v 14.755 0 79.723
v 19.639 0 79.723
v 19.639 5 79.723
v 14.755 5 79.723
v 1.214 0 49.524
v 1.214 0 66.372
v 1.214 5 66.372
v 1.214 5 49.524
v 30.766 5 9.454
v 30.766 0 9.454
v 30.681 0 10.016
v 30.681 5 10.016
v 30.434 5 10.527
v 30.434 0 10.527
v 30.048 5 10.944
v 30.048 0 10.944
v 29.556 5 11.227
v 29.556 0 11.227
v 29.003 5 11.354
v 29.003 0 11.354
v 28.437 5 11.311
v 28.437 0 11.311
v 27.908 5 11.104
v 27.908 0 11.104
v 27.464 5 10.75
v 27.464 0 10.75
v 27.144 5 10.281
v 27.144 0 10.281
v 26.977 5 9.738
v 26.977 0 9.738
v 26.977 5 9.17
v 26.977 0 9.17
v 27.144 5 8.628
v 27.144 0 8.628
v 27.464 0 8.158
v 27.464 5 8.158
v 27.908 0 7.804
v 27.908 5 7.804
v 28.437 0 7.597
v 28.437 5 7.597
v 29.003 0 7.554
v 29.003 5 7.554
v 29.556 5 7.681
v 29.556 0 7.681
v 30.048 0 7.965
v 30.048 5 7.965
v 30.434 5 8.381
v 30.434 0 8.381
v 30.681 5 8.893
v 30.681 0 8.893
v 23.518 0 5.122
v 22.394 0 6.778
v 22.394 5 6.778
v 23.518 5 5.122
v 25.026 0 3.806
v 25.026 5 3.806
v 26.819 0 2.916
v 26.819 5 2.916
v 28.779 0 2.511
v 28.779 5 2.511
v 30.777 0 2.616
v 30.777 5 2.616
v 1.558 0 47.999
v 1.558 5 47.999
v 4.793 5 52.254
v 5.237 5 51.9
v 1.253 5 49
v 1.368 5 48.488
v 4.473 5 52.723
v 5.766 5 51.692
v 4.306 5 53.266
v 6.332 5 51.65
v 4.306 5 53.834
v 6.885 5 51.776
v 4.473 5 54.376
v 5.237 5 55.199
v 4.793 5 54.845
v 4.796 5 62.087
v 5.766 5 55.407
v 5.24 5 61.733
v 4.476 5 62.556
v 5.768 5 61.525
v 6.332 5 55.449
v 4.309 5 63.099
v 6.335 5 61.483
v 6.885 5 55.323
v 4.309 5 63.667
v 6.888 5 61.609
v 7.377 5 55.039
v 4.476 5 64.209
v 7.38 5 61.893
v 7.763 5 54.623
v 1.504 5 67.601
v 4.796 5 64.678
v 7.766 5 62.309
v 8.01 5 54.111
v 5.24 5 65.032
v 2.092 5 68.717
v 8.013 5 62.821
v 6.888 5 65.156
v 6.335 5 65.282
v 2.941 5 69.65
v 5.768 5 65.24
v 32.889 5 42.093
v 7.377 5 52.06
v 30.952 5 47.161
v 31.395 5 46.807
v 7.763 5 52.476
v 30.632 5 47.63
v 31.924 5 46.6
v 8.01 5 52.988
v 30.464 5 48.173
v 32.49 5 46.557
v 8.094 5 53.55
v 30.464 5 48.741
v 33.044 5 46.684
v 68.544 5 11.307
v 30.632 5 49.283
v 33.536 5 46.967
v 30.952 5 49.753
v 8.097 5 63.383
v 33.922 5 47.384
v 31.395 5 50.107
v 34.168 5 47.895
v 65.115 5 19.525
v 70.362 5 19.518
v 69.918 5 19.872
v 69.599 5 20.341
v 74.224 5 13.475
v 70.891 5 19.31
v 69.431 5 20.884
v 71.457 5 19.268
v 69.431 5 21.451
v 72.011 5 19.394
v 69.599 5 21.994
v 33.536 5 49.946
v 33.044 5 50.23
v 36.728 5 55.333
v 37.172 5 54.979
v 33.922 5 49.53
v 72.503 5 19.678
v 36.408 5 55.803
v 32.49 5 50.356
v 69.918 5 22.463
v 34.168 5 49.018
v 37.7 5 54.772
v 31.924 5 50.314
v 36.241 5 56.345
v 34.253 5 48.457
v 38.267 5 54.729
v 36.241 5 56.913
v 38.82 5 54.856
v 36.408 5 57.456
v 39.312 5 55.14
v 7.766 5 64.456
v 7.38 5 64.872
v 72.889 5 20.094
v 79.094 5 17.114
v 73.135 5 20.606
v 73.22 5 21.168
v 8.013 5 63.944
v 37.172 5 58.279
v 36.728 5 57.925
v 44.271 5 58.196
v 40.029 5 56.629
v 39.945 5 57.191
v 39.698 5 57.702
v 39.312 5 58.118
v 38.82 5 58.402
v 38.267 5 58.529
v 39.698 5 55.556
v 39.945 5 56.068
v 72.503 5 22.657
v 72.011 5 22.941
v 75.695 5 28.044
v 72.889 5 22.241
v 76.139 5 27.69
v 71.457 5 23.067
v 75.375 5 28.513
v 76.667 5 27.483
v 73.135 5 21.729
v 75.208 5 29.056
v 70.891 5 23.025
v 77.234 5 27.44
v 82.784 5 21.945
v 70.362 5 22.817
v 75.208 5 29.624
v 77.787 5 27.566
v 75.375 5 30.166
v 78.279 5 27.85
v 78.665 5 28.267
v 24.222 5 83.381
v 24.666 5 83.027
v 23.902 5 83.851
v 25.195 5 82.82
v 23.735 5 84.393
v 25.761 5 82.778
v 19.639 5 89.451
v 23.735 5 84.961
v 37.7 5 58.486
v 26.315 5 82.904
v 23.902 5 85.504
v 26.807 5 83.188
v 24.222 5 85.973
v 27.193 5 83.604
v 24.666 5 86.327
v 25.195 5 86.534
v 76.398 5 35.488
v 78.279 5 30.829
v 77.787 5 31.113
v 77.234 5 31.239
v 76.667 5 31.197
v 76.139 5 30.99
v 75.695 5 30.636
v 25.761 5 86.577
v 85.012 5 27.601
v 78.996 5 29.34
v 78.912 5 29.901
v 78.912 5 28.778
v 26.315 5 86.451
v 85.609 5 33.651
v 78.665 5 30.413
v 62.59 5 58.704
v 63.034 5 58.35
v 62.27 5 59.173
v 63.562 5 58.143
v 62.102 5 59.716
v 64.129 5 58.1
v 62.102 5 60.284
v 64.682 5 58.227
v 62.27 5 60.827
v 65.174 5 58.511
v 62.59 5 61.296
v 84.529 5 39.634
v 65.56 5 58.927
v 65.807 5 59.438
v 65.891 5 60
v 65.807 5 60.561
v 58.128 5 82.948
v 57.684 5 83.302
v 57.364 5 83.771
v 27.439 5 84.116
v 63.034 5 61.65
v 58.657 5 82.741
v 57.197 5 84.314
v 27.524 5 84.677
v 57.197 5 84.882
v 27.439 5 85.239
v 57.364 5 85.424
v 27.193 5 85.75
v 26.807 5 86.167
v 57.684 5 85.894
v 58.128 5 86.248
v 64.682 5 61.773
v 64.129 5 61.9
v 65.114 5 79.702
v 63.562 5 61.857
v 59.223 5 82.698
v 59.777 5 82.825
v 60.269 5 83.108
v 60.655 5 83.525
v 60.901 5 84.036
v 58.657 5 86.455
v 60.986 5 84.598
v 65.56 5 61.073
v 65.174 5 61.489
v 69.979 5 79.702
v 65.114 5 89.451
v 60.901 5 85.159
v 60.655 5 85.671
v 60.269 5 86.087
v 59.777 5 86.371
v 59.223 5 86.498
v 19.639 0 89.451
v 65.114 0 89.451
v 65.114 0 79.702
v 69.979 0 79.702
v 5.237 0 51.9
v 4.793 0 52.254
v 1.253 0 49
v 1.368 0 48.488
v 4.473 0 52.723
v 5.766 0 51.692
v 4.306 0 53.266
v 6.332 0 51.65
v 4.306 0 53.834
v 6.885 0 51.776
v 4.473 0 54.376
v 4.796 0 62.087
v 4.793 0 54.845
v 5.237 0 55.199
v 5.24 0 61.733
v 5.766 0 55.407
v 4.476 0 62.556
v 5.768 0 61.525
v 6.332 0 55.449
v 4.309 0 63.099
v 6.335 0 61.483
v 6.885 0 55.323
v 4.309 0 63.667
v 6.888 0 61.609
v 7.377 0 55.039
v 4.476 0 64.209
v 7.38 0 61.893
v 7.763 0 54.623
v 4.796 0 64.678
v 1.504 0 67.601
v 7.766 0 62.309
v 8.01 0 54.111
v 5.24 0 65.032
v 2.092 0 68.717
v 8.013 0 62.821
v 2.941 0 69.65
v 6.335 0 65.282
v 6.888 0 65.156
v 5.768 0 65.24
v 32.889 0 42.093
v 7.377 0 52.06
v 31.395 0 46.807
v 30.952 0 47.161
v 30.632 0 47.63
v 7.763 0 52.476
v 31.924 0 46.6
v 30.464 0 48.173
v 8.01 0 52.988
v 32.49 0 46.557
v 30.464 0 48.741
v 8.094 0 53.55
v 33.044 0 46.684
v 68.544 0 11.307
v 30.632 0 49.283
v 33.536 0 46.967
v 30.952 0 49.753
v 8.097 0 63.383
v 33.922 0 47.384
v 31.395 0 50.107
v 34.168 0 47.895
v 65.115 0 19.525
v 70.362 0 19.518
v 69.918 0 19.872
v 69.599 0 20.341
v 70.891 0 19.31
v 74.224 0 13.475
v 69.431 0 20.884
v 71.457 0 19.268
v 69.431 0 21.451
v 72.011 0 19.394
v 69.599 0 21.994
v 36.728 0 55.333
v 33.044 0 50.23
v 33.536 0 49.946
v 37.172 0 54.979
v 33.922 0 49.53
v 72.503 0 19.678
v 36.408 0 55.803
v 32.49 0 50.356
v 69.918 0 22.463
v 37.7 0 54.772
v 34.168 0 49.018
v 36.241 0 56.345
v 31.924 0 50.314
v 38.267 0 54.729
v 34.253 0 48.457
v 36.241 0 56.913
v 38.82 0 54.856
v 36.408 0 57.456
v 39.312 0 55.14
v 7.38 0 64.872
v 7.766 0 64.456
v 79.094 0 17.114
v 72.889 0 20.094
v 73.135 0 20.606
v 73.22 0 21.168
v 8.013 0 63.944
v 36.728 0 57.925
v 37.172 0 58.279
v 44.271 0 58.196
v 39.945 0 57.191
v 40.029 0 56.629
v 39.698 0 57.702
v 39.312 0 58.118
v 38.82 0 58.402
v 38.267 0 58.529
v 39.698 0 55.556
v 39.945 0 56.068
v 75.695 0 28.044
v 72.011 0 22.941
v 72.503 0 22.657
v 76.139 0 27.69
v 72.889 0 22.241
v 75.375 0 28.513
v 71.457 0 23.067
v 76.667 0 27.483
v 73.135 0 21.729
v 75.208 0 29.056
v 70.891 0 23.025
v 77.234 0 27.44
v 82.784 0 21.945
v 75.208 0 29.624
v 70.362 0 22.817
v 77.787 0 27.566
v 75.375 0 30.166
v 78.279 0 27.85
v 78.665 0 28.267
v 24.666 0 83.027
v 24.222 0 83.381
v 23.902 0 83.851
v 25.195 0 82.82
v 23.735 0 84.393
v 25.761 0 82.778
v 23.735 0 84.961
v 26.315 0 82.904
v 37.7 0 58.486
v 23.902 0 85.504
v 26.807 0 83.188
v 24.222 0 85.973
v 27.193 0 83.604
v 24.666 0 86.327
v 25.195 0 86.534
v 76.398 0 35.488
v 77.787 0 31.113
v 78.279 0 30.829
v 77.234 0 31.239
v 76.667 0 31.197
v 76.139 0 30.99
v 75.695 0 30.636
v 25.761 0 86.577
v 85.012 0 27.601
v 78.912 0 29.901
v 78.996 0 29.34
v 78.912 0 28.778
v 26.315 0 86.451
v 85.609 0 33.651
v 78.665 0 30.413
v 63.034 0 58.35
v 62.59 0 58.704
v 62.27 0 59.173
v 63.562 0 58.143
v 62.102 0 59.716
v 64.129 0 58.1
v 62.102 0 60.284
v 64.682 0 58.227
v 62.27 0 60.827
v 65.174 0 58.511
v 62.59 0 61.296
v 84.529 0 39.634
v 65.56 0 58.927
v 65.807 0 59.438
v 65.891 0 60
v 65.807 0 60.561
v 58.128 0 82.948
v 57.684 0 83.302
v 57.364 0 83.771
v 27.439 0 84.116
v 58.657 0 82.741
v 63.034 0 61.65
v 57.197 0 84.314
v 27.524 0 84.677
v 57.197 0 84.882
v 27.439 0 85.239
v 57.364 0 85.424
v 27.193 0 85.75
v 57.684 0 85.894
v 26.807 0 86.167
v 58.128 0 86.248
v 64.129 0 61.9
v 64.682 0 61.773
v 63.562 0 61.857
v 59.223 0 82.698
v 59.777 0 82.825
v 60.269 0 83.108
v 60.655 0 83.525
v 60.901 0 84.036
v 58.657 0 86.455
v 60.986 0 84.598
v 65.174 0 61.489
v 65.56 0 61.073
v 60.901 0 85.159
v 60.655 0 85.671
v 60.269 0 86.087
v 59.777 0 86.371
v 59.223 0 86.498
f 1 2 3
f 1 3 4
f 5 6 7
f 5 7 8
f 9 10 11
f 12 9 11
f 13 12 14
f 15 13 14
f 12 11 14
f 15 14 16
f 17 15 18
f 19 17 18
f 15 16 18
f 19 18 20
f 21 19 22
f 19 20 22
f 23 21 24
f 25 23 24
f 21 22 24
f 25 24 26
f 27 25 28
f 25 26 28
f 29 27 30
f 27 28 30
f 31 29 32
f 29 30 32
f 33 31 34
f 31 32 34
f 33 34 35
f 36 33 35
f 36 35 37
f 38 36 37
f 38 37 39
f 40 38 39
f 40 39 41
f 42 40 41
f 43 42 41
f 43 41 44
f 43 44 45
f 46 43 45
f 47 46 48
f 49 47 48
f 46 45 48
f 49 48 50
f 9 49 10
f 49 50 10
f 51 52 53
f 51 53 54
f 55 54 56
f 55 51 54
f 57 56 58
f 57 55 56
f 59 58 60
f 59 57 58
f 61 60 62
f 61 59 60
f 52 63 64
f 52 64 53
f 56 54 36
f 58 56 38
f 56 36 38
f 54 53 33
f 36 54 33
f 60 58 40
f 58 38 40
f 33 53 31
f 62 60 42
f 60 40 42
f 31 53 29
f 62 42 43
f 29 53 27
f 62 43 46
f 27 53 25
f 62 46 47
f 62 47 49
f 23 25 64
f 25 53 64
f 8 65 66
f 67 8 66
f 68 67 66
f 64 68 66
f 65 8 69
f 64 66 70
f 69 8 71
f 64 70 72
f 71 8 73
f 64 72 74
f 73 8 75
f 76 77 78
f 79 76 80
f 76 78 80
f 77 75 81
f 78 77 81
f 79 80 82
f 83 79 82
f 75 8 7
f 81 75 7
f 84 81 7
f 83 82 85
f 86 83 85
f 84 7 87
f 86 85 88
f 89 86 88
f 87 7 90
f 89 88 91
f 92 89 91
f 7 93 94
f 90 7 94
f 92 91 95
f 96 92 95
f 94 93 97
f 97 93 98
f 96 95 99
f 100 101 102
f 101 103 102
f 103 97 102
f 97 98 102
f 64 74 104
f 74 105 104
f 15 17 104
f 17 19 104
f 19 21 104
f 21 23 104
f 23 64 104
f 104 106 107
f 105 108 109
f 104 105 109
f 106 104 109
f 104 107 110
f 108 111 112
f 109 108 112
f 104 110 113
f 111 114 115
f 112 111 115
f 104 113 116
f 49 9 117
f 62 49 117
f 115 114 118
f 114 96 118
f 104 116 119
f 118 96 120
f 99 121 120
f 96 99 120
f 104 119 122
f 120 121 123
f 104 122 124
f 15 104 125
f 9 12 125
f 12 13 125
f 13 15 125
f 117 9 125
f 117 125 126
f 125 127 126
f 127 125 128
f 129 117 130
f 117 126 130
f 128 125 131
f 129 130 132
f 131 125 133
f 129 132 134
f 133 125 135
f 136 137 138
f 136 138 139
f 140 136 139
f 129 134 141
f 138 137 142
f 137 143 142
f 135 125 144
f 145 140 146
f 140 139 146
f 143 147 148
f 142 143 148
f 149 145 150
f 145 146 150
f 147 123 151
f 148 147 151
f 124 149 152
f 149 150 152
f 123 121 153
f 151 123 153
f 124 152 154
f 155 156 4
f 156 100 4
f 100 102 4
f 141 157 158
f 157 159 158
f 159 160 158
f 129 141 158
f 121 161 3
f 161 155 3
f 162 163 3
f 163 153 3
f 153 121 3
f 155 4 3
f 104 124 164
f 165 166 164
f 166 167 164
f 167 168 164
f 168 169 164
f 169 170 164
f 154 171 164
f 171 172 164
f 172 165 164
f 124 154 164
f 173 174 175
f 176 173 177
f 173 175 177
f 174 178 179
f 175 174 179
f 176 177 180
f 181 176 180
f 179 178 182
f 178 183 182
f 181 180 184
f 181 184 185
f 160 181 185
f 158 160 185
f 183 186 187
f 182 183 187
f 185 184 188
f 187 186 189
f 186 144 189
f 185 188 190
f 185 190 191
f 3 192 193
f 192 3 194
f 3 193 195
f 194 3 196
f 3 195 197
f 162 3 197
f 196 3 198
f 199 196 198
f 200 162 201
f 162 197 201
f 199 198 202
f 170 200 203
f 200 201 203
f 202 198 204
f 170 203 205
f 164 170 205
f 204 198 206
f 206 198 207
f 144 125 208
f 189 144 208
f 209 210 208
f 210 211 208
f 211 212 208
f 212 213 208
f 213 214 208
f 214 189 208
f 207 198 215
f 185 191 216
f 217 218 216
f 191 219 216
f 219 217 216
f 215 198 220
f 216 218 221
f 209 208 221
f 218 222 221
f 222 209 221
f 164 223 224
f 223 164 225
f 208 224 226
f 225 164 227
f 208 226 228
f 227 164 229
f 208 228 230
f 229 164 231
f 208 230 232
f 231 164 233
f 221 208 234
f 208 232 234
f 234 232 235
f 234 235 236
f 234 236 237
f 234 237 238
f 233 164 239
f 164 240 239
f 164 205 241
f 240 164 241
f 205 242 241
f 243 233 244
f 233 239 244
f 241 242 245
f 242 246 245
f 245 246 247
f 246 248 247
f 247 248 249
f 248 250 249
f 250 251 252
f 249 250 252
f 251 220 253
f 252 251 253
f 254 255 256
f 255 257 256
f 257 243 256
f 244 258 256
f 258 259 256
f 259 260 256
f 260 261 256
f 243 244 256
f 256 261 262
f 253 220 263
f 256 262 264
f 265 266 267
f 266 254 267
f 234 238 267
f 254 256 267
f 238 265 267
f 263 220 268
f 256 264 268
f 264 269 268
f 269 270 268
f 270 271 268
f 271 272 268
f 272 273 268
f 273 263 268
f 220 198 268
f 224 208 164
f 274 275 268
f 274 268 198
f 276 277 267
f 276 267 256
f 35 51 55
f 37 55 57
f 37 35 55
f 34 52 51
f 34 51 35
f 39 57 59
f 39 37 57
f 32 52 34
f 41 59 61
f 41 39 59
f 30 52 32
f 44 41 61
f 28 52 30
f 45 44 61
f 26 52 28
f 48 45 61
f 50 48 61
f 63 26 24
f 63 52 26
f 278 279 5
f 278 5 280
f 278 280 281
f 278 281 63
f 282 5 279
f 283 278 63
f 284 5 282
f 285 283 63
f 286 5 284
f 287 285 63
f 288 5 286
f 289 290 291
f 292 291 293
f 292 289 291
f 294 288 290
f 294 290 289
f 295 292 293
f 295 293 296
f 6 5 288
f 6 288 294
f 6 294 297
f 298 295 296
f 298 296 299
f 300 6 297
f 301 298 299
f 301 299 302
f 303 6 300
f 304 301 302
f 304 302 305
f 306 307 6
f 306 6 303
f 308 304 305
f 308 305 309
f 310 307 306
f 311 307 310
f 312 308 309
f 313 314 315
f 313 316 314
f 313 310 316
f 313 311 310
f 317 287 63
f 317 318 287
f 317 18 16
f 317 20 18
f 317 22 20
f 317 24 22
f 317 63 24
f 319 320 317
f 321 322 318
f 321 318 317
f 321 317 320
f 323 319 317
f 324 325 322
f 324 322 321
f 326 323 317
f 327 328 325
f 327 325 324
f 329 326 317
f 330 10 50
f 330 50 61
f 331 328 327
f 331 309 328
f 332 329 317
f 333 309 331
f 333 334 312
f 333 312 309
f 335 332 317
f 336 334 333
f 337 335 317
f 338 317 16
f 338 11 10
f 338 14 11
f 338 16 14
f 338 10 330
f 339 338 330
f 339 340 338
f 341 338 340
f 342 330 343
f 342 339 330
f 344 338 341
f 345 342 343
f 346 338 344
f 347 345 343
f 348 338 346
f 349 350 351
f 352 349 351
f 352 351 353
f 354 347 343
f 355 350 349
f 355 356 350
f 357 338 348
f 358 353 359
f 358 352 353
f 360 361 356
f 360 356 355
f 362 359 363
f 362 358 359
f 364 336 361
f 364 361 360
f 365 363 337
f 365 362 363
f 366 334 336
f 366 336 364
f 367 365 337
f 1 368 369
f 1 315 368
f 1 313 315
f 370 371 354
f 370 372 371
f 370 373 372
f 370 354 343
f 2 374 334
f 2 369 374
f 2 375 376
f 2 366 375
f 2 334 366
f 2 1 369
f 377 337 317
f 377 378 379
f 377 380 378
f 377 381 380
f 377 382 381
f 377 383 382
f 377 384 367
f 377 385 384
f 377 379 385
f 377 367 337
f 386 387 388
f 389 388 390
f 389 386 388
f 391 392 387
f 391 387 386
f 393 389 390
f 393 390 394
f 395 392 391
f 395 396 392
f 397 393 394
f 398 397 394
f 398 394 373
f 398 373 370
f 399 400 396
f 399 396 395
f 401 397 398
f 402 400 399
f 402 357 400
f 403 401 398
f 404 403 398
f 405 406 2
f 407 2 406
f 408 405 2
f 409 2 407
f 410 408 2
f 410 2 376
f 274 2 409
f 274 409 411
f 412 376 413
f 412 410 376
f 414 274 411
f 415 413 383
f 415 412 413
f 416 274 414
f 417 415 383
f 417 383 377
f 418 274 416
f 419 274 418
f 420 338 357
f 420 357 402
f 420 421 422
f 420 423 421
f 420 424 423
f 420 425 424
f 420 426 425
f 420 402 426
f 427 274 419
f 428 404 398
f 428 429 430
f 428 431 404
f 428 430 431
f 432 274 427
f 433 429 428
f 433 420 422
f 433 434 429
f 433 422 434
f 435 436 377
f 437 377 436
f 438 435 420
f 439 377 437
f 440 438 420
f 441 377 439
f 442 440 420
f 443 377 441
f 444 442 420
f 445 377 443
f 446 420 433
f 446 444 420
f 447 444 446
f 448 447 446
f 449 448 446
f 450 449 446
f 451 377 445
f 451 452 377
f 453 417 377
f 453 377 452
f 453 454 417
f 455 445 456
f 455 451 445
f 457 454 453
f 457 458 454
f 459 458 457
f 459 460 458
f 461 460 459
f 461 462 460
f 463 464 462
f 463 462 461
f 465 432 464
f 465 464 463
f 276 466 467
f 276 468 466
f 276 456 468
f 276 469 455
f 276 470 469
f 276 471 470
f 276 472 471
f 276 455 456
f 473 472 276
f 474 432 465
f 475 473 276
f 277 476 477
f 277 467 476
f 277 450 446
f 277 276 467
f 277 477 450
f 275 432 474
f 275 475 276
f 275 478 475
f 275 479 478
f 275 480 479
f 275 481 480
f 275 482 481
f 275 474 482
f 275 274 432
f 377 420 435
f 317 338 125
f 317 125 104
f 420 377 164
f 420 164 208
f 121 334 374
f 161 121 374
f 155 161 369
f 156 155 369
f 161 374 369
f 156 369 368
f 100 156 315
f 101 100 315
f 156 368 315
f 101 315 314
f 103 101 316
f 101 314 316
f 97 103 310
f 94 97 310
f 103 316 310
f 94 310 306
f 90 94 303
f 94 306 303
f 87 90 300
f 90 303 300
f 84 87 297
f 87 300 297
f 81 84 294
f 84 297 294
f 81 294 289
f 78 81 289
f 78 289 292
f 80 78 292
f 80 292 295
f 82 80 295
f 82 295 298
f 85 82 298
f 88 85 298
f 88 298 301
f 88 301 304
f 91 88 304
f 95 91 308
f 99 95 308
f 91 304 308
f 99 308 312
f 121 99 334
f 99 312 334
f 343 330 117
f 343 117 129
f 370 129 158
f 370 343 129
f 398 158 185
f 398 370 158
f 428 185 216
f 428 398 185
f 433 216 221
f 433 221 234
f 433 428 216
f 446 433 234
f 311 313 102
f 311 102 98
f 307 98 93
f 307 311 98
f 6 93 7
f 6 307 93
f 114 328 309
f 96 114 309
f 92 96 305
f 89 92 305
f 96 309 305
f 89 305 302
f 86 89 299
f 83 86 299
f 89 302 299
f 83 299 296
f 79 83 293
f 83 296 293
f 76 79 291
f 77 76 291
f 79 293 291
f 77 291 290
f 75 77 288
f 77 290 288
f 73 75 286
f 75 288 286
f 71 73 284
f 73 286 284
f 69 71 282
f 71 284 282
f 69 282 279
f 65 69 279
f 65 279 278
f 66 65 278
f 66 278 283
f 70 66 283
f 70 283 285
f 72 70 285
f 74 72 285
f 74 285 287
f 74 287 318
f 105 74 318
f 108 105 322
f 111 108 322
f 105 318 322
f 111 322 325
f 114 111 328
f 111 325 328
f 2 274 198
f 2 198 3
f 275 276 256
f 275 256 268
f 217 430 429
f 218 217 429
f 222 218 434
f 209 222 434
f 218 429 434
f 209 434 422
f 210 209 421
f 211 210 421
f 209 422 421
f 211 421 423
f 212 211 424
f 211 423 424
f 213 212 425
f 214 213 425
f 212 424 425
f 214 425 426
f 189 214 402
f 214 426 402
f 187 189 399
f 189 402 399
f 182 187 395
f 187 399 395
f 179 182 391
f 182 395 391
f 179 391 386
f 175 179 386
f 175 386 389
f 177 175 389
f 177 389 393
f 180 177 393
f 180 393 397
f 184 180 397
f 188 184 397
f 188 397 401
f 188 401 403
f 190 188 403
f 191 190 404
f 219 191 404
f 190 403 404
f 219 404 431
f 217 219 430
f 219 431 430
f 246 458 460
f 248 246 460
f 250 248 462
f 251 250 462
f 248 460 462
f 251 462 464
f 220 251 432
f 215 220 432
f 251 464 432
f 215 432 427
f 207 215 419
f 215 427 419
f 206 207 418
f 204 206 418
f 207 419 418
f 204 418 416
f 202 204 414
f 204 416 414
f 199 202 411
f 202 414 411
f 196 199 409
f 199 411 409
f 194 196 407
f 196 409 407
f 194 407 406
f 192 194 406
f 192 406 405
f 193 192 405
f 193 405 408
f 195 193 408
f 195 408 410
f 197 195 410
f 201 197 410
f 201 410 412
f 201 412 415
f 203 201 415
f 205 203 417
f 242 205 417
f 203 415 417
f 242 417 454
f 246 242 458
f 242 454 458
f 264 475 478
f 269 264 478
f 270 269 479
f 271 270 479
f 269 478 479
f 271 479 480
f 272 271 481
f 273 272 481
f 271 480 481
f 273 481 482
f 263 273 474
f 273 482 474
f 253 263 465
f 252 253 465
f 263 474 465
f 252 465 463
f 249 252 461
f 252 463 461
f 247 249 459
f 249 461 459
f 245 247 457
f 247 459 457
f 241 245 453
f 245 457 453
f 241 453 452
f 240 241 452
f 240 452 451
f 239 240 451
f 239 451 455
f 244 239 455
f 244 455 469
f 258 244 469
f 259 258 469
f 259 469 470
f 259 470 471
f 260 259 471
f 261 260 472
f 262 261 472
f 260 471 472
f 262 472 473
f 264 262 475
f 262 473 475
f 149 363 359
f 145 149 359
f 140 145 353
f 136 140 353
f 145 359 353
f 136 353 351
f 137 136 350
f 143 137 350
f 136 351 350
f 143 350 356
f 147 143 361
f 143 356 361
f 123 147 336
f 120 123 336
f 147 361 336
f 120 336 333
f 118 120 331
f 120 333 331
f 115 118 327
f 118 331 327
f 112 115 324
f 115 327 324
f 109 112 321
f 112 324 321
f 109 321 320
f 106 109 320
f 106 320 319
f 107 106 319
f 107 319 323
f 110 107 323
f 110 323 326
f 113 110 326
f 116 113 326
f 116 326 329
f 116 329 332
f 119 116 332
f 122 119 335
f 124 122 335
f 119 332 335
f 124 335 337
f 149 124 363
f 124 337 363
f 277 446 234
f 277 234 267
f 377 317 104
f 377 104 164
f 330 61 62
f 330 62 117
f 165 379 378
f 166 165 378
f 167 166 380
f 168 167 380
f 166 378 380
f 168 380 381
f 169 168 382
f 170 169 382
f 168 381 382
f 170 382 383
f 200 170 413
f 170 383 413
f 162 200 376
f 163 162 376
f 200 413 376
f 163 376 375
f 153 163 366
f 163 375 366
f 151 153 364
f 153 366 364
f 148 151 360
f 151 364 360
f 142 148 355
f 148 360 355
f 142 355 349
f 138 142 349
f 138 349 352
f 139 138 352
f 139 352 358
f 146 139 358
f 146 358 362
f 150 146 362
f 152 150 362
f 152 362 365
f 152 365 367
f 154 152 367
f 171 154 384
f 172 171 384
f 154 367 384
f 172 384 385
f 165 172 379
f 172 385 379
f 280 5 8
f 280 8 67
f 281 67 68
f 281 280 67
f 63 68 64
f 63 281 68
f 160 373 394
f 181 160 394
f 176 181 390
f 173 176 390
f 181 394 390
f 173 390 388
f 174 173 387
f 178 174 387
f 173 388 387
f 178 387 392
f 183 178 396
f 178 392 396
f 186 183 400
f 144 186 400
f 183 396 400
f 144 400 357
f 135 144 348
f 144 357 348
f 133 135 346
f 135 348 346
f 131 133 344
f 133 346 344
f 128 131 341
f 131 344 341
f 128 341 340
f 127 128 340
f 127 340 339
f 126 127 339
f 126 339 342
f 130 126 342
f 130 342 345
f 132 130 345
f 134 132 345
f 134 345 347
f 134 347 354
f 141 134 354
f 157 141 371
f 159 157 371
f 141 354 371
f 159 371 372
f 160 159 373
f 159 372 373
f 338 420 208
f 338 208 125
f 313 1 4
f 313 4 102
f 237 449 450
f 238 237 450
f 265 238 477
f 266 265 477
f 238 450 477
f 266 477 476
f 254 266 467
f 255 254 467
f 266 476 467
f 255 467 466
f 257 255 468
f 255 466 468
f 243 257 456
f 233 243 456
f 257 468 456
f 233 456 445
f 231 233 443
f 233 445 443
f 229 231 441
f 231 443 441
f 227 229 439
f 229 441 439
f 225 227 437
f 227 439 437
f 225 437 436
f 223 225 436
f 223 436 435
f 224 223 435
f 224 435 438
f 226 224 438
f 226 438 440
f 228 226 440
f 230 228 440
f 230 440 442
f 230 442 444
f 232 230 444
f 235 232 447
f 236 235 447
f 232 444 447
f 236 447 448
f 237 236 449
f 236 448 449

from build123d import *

# Parameters (mm, degrees)
F0_R     = 1.905
F1_DEPTH = 5


with BuildPart() as f1:
    # F0 (on Front) → F1 (new body)
    with BuildSketch(Plane.XZ):
        with BuildLine():
            Line((65.113842, 89.450538), (19.638577, 89.450538))
            Line((19.638577, 89.450538), (19.638577, 79.722829))
            Line((19.638577, 79.722829), (14.755342, 79.722829))
            Line((14.755342, 79.722829), (2.940716, 69.650203))
            ThreePointArc((2.940716, 69.650203), (1.762344, 68.177362), (1.214478, 66.372462))
            Line((1.214478, 66.372462), (1.214478, 49.523853))
            ThreePointArc((1.214478, 49.523853), (1.301303, 48.742133), (1.557545, 47.998518))
            Line((1.557545, 47.998518), (22.394331, 6.778323))
            ThreePointArc((22.394331, 6.778323), (25.894047, 3.30378), (30.777479, 2.616351))
            Line((30.777479, 2.616351), (68.54441, 11.307366))
            ThreePointArc((68.54441, 11.307366), (82.783914, 21.945088), (84.528677, 39.633512))
            Line((84.528677, 39.633512), (69.979429, 79.702094))
            Line((69.979429, 79.702094), (65.113842, 79.702094))
            Line((65.113842, 79.702094), (65.113842, 89.450538))
        make_face()
        with Locations((28.860504, 9.454119)):
            Circle(F0_R, mode=Mode.SUBTRACT)
        with Locations((71.314917, 21.167528)):
            Circle(F0_R, mode=Mode.SUBTRACT)
        Polygon((65.114856, 19.524755), (32.888938, 42.093192), (44.271119, 58.196455), (76.398229, 35.488227), align=None, mode=Mode.SUBTRACT)
        with Locations((77.09127, 29.339786)):
            Circle(F0_R, mode=Mode.SUBTRACT)
        with Locations((6.189452, 53.549591)):
            Circle(F0_R, mode=Mode.SUBTRACT)
        with Locations((6.192373, 63.382605)):
            Circle(F0_R, mode=Mode.SUBTRACT)
        with Locations((32.347996, 48.456819)):
            Circle(F0_R, mode=Mode.SUBTRACT)
        with Locations((38.124348, 56.629078)):
            Circle(F0_R, mode=Mode.SUBTRACT)
        with Locations((25.618793, 84.67719)):
            Circle(F0_R, mode=Mode.SUBTRACT)
        with Locations((63.986167, 59.999965)):
            Circle(F0_R, mode=Mode.SUBTRACT)
        with Locations((59.080809, 84.597848)):
            Circle(F0_R, mode=Mode.SUBTRACT)
    extrude(amount=-F1_DEPTH)


solid = f1.part
